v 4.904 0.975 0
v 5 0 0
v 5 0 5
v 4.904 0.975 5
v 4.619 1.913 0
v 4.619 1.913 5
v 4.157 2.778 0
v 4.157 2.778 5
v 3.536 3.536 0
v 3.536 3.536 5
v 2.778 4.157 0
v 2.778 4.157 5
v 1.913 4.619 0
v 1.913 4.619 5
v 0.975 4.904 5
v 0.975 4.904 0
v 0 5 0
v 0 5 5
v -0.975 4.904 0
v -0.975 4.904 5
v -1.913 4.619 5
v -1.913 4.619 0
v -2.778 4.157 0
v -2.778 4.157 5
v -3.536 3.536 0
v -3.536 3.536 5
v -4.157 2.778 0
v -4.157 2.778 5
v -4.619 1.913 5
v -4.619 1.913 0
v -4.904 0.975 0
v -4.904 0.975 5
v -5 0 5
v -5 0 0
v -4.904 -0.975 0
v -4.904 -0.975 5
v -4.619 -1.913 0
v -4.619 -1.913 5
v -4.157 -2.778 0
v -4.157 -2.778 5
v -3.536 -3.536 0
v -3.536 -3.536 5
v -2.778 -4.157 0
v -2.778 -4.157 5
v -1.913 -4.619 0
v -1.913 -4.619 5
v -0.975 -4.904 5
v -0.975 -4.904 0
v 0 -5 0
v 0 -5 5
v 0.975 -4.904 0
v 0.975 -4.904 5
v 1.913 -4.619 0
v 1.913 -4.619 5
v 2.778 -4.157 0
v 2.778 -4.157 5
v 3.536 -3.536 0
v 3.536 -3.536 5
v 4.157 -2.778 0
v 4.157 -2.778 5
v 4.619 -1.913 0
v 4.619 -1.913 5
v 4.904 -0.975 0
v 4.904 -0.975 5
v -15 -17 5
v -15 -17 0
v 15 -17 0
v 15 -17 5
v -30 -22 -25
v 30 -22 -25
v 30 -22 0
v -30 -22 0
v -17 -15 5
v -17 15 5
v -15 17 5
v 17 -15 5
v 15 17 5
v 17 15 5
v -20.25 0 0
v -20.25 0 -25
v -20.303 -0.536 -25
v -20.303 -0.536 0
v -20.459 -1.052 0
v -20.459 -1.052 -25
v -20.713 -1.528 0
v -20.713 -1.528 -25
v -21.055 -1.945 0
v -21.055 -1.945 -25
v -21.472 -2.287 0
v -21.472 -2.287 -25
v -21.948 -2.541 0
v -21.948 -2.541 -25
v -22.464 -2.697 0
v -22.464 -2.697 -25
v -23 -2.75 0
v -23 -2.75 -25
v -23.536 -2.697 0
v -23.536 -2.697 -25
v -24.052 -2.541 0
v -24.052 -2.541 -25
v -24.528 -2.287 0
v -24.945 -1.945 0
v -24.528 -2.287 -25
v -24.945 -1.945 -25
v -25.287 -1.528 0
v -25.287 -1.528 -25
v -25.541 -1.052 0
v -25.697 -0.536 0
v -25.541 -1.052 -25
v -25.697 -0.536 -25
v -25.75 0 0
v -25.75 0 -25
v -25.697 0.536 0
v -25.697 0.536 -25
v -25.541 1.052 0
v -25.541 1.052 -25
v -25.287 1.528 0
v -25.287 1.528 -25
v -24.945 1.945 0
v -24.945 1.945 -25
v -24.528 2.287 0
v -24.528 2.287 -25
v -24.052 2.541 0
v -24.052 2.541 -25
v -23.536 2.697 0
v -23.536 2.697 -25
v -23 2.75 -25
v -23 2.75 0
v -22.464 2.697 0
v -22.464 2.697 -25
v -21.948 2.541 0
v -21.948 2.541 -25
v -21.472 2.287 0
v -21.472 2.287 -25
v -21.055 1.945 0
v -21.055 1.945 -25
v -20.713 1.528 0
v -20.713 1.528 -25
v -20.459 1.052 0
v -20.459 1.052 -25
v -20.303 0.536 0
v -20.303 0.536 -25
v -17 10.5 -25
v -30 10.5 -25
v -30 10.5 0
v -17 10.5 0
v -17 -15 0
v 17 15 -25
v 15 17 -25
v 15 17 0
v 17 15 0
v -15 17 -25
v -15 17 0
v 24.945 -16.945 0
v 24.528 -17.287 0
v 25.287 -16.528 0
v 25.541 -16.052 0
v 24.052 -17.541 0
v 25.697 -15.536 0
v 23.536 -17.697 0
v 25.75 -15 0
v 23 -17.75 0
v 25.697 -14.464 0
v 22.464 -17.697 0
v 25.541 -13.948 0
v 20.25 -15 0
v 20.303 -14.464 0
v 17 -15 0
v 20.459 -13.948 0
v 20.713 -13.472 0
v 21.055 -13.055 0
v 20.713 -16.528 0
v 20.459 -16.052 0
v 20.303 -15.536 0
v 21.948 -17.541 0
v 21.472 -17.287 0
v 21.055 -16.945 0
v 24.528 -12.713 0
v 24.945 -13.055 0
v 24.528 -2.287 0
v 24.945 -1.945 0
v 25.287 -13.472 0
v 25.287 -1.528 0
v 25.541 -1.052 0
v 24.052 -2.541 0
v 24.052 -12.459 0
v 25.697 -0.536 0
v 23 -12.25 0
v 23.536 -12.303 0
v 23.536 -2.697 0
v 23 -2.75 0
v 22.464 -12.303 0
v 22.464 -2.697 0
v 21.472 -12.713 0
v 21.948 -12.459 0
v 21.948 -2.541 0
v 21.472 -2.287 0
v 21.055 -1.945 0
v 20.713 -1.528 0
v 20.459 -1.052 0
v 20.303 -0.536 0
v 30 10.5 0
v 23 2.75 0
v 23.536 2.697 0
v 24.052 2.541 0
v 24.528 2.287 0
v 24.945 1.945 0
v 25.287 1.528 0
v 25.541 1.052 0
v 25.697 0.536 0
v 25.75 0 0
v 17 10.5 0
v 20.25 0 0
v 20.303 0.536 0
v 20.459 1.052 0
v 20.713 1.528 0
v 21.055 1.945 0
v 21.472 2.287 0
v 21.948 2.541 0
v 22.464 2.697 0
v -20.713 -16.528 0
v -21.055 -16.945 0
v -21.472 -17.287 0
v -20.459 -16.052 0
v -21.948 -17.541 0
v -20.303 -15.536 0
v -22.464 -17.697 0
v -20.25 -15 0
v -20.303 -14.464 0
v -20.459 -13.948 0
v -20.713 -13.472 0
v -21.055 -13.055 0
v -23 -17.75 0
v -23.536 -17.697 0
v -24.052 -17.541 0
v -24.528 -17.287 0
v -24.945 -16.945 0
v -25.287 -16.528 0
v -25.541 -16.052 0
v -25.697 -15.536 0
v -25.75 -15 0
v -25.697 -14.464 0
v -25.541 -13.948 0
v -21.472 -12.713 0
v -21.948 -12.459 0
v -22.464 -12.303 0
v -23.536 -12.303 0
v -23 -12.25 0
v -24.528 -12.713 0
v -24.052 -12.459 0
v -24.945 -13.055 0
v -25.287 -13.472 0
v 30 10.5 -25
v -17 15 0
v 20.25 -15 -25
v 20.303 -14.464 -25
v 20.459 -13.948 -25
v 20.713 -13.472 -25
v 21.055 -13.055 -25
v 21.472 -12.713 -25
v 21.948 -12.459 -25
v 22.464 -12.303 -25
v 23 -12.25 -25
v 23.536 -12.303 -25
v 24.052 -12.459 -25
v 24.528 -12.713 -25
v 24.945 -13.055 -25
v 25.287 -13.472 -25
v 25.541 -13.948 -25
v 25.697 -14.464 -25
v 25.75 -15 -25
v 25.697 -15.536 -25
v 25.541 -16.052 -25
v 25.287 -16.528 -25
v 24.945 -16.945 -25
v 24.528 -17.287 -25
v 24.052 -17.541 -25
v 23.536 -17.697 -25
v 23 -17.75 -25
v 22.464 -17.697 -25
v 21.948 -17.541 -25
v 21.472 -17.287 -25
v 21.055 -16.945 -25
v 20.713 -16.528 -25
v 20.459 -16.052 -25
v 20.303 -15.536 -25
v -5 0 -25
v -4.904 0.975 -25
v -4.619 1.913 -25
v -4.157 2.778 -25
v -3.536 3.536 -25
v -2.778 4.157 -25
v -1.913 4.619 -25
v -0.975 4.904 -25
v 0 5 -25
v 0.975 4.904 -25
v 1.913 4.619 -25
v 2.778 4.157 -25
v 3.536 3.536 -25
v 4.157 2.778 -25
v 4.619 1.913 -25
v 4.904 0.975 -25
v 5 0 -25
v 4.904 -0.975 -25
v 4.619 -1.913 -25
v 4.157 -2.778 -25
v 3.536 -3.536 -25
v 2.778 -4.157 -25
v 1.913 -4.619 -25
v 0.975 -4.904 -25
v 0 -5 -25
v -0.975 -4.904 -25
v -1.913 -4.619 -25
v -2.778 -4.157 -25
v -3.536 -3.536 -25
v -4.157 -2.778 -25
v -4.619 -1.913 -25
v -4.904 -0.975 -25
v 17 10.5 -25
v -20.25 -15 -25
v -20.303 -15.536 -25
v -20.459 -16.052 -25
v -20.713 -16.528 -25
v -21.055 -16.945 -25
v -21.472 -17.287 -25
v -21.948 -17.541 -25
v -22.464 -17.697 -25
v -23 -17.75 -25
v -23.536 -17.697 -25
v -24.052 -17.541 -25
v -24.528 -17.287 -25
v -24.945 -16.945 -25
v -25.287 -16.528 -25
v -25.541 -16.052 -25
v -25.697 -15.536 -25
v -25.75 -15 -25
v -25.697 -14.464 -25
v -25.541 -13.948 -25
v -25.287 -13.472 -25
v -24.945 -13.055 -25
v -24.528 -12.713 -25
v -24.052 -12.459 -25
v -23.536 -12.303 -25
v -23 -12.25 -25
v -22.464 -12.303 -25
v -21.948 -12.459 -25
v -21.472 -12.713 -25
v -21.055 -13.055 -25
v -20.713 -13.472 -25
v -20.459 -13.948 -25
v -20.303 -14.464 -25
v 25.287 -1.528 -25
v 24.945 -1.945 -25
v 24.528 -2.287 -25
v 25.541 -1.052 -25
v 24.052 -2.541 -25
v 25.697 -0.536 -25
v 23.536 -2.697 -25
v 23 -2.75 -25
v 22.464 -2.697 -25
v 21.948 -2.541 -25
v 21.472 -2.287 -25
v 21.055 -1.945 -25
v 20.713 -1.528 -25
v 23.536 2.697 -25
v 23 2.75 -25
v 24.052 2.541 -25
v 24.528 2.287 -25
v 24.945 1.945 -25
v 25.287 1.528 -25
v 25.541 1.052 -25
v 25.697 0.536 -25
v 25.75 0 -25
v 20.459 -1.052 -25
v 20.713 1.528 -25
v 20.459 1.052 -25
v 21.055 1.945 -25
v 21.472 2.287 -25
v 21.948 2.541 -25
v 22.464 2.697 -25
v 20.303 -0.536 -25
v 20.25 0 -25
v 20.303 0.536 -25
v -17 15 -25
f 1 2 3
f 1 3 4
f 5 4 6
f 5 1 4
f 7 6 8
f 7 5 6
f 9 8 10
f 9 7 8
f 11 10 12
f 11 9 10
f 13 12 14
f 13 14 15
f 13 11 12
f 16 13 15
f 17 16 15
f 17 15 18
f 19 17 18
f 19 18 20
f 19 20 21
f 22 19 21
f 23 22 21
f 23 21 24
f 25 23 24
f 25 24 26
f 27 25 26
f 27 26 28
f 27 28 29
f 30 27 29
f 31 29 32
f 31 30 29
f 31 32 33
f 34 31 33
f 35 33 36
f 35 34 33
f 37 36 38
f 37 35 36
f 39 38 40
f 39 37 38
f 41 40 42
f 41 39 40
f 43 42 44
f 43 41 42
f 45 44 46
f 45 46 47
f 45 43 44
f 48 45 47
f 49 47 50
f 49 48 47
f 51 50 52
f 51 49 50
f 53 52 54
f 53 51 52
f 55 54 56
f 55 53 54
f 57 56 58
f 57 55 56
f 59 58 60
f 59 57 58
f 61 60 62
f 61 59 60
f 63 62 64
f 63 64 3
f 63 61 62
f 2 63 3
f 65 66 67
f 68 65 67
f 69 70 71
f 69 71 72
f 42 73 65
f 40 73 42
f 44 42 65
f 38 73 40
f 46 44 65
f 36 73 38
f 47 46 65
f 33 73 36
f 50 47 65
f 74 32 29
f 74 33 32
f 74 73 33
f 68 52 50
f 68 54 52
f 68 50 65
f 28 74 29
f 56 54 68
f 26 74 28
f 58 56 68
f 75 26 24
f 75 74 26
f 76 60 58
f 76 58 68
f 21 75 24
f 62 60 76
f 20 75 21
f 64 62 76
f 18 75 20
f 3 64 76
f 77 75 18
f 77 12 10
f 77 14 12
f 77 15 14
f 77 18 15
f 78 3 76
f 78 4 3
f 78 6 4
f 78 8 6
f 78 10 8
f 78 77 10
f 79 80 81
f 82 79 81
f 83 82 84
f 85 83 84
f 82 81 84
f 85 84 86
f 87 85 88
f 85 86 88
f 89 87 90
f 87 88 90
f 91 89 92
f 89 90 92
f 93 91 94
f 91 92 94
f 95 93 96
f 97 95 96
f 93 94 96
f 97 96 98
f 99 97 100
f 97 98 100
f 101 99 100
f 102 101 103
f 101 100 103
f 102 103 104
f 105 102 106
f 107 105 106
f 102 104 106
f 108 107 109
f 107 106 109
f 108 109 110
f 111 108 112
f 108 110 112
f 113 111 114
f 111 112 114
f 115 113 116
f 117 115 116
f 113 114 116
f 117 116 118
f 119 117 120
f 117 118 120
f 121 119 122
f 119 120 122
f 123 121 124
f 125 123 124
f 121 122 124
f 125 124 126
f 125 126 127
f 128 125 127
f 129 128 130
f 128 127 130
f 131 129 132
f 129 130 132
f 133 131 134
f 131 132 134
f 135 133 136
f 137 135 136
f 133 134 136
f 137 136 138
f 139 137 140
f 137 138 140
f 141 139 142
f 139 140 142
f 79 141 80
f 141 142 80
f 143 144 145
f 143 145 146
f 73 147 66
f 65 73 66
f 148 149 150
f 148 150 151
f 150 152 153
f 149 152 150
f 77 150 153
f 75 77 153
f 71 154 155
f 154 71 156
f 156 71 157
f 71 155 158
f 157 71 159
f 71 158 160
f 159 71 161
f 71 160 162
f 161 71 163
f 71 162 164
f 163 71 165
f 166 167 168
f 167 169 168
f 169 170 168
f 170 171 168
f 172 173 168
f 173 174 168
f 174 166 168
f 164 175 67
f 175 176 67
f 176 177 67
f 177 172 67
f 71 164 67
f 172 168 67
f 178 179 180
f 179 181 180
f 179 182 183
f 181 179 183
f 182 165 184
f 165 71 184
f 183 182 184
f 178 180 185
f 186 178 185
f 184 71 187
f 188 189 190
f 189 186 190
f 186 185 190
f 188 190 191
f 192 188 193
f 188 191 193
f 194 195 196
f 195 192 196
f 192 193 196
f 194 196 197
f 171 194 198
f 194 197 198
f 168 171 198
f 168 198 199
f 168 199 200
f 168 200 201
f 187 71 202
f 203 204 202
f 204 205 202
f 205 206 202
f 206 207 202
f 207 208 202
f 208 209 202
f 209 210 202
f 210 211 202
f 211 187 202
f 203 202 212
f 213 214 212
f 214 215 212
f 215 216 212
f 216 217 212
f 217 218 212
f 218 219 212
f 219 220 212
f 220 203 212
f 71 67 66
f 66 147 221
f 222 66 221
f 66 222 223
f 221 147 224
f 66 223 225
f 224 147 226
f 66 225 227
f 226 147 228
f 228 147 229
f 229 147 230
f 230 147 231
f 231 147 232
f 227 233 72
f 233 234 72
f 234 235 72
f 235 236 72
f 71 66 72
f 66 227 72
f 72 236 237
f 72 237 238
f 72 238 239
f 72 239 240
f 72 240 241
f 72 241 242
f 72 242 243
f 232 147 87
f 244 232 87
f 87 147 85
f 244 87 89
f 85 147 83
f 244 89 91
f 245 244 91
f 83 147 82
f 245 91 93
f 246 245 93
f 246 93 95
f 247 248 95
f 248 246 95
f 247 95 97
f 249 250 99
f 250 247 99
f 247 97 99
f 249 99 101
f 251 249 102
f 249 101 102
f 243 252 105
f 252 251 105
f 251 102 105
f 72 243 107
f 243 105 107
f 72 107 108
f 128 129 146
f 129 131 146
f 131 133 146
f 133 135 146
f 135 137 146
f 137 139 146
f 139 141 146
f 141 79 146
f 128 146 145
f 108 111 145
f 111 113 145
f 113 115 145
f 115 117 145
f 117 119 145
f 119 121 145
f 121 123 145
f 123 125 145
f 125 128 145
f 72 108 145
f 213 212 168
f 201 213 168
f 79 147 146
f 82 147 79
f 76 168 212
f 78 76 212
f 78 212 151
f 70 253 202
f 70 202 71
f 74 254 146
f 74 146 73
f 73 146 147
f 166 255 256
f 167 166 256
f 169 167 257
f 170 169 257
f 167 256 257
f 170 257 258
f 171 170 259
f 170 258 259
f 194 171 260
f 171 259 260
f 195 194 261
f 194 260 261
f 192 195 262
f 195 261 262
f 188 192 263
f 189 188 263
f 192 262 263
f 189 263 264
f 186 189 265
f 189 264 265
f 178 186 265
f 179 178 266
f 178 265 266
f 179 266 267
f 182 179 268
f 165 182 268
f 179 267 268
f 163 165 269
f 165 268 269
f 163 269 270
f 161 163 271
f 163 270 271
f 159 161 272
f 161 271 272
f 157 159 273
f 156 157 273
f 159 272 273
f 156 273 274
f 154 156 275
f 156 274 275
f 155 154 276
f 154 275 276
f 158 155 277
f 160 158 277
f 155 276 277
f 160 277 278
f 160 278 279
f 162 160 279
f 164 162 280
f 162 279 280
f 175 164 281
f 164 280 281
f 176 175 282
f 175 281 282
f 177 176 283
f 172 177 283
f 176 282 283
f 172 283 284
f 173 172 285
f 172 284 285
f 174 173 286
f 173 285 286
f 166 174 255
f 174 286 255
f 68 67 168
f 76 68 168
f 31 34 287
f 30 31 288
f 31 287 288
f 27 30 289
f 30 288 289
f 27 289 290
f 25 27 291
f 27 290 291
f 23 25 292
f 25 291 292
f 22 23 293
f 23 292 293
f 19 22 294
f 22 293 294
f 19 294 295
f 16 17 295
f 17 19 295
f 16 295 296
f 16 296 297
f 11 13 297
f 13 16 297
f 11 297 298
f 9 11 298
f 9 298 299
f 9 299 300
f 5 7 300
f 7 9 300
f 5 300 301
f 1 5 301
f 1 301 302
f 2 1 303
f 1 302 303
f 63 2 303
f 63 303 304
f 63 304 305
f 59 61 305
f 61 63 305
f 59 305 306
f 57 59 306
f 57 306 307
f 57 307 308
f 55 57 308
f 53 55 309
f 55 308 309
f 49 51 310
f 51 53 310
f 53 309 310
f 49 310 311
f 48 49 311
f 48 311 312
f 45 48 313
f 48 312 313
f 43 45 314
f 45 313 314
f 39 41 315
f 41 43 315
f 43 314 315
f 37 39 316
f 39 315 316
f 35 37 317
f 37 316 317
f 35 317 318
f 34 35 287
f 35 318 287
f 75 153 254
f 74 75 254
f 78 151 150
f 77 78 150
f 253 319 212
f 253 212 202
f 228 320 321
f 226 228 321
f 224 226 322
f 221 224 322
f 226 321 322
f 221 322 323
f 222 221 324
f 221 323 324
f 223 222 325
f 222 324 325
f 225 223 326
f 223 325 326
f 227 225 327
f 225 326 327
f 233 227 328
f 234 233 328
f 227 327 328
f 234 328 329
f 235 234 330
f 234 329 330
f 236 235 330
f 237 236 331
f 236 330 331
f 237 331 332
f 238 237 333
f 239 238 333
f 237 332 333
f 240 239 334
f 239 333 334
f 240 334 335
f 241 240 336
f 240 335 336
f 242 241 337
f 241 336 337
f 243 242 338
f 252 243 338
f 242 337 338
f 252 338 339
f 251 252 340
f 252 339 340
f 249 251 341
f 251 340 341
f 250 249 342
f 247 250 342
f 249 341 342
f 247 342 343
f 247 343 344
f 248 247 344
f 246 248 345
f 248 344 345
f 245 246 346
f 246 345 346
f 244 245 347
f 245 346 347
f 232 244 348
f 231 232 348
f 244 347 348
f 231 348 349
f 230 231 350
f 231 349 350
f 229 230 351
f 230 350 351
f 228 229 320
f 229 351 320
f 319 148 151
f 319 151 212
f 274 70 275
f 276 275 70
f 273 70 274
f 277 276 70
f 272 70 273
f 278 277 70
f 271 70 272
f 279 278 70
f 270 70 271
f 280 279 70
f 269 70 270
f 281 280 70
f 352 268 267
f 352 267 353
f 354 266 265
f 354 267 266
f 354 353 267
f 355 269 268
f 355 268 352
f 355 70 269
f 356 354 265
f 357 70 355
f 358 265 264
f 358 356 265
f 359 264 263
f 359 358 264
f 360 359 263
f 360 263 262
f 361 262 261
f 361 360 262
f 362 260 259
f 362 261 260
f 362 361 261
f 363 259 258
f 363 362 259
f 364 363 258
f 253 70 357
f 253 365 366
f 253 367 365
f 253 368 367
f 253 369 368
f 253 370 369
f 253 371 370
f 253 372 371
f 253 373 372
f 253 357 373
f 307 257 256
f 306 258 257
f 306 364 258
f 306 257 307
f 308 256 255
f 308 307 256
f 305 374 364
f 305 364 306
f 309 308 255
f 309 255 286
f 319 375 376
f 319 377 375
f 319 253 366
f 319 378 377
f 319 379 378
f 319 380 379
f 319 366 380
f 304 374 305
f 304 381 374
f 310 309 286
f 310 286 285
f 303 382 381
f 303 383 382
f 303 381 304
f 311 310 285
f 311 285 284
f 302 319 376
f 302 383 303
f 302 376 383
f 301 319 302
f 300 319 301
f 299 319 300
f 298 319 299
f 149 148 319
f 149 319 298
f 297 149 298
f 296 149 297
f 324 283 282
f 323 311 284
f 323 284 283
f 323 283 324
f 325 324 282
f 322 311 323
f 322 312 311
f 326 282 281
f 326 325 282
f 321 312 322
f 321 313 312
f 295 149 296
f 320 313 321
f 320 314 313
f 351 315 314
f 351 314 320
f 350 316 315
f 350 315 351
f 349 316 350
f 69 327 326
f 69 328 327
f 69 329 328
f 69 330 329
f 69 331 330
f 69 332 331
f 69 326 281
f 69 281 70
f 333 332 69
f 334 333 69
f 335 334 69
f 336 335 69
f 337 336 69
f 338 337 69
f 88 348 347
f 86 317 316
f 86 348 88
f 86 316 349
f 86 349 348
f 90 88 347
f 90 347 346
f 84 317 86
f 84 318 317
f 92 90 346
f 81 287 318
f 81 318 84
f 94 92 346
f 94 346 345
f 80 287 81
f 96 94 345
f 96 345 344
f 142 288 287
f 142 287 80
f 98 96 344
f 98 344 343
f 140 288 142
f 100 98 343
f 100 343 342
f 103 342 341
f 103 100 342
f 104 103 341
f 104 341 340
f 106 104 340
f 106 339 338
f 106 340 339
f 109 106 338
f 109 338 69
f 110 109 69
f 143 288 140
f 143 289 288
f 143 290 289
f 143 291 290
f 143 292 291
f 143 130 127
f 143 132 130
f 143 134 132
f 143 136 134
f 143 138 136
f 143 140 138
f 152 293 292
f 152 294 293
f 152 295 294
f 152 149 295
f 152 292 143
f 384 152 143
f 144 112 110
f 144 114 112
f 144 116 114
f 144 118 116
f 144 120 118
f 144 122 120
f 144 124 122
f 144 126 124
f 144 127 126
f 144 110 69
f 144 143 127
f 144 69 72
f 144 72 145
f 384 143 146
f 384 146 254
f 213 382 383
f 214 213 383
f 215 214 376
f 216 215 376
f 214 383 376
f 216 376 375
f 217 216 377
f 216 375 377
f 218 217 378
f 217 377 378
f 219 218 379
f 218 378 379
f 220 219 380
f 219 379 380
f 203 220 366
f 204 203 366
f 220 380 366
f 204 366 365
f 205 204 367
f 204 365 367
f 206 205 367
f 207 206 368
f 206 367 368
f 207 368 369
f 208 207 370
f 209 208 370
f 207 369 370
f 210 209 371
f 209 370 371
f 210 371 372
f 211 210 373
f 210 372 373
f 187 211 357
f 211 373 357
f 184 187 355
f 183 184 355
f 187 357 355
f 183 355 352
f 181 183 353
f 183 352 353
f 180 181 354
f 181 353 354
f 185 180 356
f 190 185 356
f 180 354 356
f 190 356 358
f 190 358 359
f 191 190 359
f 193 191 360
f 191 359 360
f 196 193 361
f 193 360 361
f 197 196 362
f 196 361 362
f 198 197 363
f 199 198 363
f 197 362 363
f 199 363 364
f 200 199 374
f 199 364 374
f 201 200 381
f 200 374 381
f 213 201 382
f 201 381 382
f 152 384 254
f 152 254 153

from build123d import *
from build123d.topology import SkipClean

# Parameters (mm, degrees)
SKETCH1_R           = 5
BOSS_EXTRUDE1_DEPTH = 5
BOSS_EXTRUDE2_START = 25
SKETCH2_R           = 5
SKETCH2_R_2         = 2.75
BOSS_EXTRUDE2_DEPTH = 25


with BuildPart() as part:
    # Sketch1 → Boss-Extrude1 (new body)
    with BuildSketch(Plane.XY):
        Polygon((15, 17), (-15, 17), (-17, 15), (-17, -15), (-15, -17), (15, -17), (17, -15), (17, 15), align=None)
        Circle(SKETCH1_R, mode=Mode.SUBTRACT)
    extrude(amount=BOSS_EXTRUDE1_DEPTH)

    # Sketch2 → Boss-Extrude2 (add)
    with SkipClean():  # the faces are left unmerged after this step: merging them gives an invalid solid
        with BuildSketch(Plane(origin=(0, 0, 0), x_dir=(-1, 0, 0), z_dir=(0, 0, -1)).offset(BOSS_EXTRUDE2_START)):
            Polygon((15, 17), (-15, 17), (-17, 15), (-17, 10.5), (-30, 10.5), (-30, -22), (30, -22), (30, 10.5), (17, 10.5), (17, 15), align=None)
            Circle(SKETCH2_R, mode=Mode.SUBTRACT)
            with Locations((-23, 0)):
                Circle(SKETCH2_R_2, mode=Mode.SUBTRACT)
            with Locations((-23, -15)):
                Circle(SKETCH2_R_2, mode=Mode.SUBTRACT)
            with Locations(Location((23, -15, 0), (0, 0, 180))):
                Circle(SKETCH2_R_2, mode=Mode.SUBTRACT)
            with Locations(Location((23, 0, 0), (0, 0, 180))):
                Circle(SKETCH2_R_2, mode=Mode.SUBTRACT)
        extrude(amount=-BOSS_EXTRUDE2_DEPTH)


solid = part.part
